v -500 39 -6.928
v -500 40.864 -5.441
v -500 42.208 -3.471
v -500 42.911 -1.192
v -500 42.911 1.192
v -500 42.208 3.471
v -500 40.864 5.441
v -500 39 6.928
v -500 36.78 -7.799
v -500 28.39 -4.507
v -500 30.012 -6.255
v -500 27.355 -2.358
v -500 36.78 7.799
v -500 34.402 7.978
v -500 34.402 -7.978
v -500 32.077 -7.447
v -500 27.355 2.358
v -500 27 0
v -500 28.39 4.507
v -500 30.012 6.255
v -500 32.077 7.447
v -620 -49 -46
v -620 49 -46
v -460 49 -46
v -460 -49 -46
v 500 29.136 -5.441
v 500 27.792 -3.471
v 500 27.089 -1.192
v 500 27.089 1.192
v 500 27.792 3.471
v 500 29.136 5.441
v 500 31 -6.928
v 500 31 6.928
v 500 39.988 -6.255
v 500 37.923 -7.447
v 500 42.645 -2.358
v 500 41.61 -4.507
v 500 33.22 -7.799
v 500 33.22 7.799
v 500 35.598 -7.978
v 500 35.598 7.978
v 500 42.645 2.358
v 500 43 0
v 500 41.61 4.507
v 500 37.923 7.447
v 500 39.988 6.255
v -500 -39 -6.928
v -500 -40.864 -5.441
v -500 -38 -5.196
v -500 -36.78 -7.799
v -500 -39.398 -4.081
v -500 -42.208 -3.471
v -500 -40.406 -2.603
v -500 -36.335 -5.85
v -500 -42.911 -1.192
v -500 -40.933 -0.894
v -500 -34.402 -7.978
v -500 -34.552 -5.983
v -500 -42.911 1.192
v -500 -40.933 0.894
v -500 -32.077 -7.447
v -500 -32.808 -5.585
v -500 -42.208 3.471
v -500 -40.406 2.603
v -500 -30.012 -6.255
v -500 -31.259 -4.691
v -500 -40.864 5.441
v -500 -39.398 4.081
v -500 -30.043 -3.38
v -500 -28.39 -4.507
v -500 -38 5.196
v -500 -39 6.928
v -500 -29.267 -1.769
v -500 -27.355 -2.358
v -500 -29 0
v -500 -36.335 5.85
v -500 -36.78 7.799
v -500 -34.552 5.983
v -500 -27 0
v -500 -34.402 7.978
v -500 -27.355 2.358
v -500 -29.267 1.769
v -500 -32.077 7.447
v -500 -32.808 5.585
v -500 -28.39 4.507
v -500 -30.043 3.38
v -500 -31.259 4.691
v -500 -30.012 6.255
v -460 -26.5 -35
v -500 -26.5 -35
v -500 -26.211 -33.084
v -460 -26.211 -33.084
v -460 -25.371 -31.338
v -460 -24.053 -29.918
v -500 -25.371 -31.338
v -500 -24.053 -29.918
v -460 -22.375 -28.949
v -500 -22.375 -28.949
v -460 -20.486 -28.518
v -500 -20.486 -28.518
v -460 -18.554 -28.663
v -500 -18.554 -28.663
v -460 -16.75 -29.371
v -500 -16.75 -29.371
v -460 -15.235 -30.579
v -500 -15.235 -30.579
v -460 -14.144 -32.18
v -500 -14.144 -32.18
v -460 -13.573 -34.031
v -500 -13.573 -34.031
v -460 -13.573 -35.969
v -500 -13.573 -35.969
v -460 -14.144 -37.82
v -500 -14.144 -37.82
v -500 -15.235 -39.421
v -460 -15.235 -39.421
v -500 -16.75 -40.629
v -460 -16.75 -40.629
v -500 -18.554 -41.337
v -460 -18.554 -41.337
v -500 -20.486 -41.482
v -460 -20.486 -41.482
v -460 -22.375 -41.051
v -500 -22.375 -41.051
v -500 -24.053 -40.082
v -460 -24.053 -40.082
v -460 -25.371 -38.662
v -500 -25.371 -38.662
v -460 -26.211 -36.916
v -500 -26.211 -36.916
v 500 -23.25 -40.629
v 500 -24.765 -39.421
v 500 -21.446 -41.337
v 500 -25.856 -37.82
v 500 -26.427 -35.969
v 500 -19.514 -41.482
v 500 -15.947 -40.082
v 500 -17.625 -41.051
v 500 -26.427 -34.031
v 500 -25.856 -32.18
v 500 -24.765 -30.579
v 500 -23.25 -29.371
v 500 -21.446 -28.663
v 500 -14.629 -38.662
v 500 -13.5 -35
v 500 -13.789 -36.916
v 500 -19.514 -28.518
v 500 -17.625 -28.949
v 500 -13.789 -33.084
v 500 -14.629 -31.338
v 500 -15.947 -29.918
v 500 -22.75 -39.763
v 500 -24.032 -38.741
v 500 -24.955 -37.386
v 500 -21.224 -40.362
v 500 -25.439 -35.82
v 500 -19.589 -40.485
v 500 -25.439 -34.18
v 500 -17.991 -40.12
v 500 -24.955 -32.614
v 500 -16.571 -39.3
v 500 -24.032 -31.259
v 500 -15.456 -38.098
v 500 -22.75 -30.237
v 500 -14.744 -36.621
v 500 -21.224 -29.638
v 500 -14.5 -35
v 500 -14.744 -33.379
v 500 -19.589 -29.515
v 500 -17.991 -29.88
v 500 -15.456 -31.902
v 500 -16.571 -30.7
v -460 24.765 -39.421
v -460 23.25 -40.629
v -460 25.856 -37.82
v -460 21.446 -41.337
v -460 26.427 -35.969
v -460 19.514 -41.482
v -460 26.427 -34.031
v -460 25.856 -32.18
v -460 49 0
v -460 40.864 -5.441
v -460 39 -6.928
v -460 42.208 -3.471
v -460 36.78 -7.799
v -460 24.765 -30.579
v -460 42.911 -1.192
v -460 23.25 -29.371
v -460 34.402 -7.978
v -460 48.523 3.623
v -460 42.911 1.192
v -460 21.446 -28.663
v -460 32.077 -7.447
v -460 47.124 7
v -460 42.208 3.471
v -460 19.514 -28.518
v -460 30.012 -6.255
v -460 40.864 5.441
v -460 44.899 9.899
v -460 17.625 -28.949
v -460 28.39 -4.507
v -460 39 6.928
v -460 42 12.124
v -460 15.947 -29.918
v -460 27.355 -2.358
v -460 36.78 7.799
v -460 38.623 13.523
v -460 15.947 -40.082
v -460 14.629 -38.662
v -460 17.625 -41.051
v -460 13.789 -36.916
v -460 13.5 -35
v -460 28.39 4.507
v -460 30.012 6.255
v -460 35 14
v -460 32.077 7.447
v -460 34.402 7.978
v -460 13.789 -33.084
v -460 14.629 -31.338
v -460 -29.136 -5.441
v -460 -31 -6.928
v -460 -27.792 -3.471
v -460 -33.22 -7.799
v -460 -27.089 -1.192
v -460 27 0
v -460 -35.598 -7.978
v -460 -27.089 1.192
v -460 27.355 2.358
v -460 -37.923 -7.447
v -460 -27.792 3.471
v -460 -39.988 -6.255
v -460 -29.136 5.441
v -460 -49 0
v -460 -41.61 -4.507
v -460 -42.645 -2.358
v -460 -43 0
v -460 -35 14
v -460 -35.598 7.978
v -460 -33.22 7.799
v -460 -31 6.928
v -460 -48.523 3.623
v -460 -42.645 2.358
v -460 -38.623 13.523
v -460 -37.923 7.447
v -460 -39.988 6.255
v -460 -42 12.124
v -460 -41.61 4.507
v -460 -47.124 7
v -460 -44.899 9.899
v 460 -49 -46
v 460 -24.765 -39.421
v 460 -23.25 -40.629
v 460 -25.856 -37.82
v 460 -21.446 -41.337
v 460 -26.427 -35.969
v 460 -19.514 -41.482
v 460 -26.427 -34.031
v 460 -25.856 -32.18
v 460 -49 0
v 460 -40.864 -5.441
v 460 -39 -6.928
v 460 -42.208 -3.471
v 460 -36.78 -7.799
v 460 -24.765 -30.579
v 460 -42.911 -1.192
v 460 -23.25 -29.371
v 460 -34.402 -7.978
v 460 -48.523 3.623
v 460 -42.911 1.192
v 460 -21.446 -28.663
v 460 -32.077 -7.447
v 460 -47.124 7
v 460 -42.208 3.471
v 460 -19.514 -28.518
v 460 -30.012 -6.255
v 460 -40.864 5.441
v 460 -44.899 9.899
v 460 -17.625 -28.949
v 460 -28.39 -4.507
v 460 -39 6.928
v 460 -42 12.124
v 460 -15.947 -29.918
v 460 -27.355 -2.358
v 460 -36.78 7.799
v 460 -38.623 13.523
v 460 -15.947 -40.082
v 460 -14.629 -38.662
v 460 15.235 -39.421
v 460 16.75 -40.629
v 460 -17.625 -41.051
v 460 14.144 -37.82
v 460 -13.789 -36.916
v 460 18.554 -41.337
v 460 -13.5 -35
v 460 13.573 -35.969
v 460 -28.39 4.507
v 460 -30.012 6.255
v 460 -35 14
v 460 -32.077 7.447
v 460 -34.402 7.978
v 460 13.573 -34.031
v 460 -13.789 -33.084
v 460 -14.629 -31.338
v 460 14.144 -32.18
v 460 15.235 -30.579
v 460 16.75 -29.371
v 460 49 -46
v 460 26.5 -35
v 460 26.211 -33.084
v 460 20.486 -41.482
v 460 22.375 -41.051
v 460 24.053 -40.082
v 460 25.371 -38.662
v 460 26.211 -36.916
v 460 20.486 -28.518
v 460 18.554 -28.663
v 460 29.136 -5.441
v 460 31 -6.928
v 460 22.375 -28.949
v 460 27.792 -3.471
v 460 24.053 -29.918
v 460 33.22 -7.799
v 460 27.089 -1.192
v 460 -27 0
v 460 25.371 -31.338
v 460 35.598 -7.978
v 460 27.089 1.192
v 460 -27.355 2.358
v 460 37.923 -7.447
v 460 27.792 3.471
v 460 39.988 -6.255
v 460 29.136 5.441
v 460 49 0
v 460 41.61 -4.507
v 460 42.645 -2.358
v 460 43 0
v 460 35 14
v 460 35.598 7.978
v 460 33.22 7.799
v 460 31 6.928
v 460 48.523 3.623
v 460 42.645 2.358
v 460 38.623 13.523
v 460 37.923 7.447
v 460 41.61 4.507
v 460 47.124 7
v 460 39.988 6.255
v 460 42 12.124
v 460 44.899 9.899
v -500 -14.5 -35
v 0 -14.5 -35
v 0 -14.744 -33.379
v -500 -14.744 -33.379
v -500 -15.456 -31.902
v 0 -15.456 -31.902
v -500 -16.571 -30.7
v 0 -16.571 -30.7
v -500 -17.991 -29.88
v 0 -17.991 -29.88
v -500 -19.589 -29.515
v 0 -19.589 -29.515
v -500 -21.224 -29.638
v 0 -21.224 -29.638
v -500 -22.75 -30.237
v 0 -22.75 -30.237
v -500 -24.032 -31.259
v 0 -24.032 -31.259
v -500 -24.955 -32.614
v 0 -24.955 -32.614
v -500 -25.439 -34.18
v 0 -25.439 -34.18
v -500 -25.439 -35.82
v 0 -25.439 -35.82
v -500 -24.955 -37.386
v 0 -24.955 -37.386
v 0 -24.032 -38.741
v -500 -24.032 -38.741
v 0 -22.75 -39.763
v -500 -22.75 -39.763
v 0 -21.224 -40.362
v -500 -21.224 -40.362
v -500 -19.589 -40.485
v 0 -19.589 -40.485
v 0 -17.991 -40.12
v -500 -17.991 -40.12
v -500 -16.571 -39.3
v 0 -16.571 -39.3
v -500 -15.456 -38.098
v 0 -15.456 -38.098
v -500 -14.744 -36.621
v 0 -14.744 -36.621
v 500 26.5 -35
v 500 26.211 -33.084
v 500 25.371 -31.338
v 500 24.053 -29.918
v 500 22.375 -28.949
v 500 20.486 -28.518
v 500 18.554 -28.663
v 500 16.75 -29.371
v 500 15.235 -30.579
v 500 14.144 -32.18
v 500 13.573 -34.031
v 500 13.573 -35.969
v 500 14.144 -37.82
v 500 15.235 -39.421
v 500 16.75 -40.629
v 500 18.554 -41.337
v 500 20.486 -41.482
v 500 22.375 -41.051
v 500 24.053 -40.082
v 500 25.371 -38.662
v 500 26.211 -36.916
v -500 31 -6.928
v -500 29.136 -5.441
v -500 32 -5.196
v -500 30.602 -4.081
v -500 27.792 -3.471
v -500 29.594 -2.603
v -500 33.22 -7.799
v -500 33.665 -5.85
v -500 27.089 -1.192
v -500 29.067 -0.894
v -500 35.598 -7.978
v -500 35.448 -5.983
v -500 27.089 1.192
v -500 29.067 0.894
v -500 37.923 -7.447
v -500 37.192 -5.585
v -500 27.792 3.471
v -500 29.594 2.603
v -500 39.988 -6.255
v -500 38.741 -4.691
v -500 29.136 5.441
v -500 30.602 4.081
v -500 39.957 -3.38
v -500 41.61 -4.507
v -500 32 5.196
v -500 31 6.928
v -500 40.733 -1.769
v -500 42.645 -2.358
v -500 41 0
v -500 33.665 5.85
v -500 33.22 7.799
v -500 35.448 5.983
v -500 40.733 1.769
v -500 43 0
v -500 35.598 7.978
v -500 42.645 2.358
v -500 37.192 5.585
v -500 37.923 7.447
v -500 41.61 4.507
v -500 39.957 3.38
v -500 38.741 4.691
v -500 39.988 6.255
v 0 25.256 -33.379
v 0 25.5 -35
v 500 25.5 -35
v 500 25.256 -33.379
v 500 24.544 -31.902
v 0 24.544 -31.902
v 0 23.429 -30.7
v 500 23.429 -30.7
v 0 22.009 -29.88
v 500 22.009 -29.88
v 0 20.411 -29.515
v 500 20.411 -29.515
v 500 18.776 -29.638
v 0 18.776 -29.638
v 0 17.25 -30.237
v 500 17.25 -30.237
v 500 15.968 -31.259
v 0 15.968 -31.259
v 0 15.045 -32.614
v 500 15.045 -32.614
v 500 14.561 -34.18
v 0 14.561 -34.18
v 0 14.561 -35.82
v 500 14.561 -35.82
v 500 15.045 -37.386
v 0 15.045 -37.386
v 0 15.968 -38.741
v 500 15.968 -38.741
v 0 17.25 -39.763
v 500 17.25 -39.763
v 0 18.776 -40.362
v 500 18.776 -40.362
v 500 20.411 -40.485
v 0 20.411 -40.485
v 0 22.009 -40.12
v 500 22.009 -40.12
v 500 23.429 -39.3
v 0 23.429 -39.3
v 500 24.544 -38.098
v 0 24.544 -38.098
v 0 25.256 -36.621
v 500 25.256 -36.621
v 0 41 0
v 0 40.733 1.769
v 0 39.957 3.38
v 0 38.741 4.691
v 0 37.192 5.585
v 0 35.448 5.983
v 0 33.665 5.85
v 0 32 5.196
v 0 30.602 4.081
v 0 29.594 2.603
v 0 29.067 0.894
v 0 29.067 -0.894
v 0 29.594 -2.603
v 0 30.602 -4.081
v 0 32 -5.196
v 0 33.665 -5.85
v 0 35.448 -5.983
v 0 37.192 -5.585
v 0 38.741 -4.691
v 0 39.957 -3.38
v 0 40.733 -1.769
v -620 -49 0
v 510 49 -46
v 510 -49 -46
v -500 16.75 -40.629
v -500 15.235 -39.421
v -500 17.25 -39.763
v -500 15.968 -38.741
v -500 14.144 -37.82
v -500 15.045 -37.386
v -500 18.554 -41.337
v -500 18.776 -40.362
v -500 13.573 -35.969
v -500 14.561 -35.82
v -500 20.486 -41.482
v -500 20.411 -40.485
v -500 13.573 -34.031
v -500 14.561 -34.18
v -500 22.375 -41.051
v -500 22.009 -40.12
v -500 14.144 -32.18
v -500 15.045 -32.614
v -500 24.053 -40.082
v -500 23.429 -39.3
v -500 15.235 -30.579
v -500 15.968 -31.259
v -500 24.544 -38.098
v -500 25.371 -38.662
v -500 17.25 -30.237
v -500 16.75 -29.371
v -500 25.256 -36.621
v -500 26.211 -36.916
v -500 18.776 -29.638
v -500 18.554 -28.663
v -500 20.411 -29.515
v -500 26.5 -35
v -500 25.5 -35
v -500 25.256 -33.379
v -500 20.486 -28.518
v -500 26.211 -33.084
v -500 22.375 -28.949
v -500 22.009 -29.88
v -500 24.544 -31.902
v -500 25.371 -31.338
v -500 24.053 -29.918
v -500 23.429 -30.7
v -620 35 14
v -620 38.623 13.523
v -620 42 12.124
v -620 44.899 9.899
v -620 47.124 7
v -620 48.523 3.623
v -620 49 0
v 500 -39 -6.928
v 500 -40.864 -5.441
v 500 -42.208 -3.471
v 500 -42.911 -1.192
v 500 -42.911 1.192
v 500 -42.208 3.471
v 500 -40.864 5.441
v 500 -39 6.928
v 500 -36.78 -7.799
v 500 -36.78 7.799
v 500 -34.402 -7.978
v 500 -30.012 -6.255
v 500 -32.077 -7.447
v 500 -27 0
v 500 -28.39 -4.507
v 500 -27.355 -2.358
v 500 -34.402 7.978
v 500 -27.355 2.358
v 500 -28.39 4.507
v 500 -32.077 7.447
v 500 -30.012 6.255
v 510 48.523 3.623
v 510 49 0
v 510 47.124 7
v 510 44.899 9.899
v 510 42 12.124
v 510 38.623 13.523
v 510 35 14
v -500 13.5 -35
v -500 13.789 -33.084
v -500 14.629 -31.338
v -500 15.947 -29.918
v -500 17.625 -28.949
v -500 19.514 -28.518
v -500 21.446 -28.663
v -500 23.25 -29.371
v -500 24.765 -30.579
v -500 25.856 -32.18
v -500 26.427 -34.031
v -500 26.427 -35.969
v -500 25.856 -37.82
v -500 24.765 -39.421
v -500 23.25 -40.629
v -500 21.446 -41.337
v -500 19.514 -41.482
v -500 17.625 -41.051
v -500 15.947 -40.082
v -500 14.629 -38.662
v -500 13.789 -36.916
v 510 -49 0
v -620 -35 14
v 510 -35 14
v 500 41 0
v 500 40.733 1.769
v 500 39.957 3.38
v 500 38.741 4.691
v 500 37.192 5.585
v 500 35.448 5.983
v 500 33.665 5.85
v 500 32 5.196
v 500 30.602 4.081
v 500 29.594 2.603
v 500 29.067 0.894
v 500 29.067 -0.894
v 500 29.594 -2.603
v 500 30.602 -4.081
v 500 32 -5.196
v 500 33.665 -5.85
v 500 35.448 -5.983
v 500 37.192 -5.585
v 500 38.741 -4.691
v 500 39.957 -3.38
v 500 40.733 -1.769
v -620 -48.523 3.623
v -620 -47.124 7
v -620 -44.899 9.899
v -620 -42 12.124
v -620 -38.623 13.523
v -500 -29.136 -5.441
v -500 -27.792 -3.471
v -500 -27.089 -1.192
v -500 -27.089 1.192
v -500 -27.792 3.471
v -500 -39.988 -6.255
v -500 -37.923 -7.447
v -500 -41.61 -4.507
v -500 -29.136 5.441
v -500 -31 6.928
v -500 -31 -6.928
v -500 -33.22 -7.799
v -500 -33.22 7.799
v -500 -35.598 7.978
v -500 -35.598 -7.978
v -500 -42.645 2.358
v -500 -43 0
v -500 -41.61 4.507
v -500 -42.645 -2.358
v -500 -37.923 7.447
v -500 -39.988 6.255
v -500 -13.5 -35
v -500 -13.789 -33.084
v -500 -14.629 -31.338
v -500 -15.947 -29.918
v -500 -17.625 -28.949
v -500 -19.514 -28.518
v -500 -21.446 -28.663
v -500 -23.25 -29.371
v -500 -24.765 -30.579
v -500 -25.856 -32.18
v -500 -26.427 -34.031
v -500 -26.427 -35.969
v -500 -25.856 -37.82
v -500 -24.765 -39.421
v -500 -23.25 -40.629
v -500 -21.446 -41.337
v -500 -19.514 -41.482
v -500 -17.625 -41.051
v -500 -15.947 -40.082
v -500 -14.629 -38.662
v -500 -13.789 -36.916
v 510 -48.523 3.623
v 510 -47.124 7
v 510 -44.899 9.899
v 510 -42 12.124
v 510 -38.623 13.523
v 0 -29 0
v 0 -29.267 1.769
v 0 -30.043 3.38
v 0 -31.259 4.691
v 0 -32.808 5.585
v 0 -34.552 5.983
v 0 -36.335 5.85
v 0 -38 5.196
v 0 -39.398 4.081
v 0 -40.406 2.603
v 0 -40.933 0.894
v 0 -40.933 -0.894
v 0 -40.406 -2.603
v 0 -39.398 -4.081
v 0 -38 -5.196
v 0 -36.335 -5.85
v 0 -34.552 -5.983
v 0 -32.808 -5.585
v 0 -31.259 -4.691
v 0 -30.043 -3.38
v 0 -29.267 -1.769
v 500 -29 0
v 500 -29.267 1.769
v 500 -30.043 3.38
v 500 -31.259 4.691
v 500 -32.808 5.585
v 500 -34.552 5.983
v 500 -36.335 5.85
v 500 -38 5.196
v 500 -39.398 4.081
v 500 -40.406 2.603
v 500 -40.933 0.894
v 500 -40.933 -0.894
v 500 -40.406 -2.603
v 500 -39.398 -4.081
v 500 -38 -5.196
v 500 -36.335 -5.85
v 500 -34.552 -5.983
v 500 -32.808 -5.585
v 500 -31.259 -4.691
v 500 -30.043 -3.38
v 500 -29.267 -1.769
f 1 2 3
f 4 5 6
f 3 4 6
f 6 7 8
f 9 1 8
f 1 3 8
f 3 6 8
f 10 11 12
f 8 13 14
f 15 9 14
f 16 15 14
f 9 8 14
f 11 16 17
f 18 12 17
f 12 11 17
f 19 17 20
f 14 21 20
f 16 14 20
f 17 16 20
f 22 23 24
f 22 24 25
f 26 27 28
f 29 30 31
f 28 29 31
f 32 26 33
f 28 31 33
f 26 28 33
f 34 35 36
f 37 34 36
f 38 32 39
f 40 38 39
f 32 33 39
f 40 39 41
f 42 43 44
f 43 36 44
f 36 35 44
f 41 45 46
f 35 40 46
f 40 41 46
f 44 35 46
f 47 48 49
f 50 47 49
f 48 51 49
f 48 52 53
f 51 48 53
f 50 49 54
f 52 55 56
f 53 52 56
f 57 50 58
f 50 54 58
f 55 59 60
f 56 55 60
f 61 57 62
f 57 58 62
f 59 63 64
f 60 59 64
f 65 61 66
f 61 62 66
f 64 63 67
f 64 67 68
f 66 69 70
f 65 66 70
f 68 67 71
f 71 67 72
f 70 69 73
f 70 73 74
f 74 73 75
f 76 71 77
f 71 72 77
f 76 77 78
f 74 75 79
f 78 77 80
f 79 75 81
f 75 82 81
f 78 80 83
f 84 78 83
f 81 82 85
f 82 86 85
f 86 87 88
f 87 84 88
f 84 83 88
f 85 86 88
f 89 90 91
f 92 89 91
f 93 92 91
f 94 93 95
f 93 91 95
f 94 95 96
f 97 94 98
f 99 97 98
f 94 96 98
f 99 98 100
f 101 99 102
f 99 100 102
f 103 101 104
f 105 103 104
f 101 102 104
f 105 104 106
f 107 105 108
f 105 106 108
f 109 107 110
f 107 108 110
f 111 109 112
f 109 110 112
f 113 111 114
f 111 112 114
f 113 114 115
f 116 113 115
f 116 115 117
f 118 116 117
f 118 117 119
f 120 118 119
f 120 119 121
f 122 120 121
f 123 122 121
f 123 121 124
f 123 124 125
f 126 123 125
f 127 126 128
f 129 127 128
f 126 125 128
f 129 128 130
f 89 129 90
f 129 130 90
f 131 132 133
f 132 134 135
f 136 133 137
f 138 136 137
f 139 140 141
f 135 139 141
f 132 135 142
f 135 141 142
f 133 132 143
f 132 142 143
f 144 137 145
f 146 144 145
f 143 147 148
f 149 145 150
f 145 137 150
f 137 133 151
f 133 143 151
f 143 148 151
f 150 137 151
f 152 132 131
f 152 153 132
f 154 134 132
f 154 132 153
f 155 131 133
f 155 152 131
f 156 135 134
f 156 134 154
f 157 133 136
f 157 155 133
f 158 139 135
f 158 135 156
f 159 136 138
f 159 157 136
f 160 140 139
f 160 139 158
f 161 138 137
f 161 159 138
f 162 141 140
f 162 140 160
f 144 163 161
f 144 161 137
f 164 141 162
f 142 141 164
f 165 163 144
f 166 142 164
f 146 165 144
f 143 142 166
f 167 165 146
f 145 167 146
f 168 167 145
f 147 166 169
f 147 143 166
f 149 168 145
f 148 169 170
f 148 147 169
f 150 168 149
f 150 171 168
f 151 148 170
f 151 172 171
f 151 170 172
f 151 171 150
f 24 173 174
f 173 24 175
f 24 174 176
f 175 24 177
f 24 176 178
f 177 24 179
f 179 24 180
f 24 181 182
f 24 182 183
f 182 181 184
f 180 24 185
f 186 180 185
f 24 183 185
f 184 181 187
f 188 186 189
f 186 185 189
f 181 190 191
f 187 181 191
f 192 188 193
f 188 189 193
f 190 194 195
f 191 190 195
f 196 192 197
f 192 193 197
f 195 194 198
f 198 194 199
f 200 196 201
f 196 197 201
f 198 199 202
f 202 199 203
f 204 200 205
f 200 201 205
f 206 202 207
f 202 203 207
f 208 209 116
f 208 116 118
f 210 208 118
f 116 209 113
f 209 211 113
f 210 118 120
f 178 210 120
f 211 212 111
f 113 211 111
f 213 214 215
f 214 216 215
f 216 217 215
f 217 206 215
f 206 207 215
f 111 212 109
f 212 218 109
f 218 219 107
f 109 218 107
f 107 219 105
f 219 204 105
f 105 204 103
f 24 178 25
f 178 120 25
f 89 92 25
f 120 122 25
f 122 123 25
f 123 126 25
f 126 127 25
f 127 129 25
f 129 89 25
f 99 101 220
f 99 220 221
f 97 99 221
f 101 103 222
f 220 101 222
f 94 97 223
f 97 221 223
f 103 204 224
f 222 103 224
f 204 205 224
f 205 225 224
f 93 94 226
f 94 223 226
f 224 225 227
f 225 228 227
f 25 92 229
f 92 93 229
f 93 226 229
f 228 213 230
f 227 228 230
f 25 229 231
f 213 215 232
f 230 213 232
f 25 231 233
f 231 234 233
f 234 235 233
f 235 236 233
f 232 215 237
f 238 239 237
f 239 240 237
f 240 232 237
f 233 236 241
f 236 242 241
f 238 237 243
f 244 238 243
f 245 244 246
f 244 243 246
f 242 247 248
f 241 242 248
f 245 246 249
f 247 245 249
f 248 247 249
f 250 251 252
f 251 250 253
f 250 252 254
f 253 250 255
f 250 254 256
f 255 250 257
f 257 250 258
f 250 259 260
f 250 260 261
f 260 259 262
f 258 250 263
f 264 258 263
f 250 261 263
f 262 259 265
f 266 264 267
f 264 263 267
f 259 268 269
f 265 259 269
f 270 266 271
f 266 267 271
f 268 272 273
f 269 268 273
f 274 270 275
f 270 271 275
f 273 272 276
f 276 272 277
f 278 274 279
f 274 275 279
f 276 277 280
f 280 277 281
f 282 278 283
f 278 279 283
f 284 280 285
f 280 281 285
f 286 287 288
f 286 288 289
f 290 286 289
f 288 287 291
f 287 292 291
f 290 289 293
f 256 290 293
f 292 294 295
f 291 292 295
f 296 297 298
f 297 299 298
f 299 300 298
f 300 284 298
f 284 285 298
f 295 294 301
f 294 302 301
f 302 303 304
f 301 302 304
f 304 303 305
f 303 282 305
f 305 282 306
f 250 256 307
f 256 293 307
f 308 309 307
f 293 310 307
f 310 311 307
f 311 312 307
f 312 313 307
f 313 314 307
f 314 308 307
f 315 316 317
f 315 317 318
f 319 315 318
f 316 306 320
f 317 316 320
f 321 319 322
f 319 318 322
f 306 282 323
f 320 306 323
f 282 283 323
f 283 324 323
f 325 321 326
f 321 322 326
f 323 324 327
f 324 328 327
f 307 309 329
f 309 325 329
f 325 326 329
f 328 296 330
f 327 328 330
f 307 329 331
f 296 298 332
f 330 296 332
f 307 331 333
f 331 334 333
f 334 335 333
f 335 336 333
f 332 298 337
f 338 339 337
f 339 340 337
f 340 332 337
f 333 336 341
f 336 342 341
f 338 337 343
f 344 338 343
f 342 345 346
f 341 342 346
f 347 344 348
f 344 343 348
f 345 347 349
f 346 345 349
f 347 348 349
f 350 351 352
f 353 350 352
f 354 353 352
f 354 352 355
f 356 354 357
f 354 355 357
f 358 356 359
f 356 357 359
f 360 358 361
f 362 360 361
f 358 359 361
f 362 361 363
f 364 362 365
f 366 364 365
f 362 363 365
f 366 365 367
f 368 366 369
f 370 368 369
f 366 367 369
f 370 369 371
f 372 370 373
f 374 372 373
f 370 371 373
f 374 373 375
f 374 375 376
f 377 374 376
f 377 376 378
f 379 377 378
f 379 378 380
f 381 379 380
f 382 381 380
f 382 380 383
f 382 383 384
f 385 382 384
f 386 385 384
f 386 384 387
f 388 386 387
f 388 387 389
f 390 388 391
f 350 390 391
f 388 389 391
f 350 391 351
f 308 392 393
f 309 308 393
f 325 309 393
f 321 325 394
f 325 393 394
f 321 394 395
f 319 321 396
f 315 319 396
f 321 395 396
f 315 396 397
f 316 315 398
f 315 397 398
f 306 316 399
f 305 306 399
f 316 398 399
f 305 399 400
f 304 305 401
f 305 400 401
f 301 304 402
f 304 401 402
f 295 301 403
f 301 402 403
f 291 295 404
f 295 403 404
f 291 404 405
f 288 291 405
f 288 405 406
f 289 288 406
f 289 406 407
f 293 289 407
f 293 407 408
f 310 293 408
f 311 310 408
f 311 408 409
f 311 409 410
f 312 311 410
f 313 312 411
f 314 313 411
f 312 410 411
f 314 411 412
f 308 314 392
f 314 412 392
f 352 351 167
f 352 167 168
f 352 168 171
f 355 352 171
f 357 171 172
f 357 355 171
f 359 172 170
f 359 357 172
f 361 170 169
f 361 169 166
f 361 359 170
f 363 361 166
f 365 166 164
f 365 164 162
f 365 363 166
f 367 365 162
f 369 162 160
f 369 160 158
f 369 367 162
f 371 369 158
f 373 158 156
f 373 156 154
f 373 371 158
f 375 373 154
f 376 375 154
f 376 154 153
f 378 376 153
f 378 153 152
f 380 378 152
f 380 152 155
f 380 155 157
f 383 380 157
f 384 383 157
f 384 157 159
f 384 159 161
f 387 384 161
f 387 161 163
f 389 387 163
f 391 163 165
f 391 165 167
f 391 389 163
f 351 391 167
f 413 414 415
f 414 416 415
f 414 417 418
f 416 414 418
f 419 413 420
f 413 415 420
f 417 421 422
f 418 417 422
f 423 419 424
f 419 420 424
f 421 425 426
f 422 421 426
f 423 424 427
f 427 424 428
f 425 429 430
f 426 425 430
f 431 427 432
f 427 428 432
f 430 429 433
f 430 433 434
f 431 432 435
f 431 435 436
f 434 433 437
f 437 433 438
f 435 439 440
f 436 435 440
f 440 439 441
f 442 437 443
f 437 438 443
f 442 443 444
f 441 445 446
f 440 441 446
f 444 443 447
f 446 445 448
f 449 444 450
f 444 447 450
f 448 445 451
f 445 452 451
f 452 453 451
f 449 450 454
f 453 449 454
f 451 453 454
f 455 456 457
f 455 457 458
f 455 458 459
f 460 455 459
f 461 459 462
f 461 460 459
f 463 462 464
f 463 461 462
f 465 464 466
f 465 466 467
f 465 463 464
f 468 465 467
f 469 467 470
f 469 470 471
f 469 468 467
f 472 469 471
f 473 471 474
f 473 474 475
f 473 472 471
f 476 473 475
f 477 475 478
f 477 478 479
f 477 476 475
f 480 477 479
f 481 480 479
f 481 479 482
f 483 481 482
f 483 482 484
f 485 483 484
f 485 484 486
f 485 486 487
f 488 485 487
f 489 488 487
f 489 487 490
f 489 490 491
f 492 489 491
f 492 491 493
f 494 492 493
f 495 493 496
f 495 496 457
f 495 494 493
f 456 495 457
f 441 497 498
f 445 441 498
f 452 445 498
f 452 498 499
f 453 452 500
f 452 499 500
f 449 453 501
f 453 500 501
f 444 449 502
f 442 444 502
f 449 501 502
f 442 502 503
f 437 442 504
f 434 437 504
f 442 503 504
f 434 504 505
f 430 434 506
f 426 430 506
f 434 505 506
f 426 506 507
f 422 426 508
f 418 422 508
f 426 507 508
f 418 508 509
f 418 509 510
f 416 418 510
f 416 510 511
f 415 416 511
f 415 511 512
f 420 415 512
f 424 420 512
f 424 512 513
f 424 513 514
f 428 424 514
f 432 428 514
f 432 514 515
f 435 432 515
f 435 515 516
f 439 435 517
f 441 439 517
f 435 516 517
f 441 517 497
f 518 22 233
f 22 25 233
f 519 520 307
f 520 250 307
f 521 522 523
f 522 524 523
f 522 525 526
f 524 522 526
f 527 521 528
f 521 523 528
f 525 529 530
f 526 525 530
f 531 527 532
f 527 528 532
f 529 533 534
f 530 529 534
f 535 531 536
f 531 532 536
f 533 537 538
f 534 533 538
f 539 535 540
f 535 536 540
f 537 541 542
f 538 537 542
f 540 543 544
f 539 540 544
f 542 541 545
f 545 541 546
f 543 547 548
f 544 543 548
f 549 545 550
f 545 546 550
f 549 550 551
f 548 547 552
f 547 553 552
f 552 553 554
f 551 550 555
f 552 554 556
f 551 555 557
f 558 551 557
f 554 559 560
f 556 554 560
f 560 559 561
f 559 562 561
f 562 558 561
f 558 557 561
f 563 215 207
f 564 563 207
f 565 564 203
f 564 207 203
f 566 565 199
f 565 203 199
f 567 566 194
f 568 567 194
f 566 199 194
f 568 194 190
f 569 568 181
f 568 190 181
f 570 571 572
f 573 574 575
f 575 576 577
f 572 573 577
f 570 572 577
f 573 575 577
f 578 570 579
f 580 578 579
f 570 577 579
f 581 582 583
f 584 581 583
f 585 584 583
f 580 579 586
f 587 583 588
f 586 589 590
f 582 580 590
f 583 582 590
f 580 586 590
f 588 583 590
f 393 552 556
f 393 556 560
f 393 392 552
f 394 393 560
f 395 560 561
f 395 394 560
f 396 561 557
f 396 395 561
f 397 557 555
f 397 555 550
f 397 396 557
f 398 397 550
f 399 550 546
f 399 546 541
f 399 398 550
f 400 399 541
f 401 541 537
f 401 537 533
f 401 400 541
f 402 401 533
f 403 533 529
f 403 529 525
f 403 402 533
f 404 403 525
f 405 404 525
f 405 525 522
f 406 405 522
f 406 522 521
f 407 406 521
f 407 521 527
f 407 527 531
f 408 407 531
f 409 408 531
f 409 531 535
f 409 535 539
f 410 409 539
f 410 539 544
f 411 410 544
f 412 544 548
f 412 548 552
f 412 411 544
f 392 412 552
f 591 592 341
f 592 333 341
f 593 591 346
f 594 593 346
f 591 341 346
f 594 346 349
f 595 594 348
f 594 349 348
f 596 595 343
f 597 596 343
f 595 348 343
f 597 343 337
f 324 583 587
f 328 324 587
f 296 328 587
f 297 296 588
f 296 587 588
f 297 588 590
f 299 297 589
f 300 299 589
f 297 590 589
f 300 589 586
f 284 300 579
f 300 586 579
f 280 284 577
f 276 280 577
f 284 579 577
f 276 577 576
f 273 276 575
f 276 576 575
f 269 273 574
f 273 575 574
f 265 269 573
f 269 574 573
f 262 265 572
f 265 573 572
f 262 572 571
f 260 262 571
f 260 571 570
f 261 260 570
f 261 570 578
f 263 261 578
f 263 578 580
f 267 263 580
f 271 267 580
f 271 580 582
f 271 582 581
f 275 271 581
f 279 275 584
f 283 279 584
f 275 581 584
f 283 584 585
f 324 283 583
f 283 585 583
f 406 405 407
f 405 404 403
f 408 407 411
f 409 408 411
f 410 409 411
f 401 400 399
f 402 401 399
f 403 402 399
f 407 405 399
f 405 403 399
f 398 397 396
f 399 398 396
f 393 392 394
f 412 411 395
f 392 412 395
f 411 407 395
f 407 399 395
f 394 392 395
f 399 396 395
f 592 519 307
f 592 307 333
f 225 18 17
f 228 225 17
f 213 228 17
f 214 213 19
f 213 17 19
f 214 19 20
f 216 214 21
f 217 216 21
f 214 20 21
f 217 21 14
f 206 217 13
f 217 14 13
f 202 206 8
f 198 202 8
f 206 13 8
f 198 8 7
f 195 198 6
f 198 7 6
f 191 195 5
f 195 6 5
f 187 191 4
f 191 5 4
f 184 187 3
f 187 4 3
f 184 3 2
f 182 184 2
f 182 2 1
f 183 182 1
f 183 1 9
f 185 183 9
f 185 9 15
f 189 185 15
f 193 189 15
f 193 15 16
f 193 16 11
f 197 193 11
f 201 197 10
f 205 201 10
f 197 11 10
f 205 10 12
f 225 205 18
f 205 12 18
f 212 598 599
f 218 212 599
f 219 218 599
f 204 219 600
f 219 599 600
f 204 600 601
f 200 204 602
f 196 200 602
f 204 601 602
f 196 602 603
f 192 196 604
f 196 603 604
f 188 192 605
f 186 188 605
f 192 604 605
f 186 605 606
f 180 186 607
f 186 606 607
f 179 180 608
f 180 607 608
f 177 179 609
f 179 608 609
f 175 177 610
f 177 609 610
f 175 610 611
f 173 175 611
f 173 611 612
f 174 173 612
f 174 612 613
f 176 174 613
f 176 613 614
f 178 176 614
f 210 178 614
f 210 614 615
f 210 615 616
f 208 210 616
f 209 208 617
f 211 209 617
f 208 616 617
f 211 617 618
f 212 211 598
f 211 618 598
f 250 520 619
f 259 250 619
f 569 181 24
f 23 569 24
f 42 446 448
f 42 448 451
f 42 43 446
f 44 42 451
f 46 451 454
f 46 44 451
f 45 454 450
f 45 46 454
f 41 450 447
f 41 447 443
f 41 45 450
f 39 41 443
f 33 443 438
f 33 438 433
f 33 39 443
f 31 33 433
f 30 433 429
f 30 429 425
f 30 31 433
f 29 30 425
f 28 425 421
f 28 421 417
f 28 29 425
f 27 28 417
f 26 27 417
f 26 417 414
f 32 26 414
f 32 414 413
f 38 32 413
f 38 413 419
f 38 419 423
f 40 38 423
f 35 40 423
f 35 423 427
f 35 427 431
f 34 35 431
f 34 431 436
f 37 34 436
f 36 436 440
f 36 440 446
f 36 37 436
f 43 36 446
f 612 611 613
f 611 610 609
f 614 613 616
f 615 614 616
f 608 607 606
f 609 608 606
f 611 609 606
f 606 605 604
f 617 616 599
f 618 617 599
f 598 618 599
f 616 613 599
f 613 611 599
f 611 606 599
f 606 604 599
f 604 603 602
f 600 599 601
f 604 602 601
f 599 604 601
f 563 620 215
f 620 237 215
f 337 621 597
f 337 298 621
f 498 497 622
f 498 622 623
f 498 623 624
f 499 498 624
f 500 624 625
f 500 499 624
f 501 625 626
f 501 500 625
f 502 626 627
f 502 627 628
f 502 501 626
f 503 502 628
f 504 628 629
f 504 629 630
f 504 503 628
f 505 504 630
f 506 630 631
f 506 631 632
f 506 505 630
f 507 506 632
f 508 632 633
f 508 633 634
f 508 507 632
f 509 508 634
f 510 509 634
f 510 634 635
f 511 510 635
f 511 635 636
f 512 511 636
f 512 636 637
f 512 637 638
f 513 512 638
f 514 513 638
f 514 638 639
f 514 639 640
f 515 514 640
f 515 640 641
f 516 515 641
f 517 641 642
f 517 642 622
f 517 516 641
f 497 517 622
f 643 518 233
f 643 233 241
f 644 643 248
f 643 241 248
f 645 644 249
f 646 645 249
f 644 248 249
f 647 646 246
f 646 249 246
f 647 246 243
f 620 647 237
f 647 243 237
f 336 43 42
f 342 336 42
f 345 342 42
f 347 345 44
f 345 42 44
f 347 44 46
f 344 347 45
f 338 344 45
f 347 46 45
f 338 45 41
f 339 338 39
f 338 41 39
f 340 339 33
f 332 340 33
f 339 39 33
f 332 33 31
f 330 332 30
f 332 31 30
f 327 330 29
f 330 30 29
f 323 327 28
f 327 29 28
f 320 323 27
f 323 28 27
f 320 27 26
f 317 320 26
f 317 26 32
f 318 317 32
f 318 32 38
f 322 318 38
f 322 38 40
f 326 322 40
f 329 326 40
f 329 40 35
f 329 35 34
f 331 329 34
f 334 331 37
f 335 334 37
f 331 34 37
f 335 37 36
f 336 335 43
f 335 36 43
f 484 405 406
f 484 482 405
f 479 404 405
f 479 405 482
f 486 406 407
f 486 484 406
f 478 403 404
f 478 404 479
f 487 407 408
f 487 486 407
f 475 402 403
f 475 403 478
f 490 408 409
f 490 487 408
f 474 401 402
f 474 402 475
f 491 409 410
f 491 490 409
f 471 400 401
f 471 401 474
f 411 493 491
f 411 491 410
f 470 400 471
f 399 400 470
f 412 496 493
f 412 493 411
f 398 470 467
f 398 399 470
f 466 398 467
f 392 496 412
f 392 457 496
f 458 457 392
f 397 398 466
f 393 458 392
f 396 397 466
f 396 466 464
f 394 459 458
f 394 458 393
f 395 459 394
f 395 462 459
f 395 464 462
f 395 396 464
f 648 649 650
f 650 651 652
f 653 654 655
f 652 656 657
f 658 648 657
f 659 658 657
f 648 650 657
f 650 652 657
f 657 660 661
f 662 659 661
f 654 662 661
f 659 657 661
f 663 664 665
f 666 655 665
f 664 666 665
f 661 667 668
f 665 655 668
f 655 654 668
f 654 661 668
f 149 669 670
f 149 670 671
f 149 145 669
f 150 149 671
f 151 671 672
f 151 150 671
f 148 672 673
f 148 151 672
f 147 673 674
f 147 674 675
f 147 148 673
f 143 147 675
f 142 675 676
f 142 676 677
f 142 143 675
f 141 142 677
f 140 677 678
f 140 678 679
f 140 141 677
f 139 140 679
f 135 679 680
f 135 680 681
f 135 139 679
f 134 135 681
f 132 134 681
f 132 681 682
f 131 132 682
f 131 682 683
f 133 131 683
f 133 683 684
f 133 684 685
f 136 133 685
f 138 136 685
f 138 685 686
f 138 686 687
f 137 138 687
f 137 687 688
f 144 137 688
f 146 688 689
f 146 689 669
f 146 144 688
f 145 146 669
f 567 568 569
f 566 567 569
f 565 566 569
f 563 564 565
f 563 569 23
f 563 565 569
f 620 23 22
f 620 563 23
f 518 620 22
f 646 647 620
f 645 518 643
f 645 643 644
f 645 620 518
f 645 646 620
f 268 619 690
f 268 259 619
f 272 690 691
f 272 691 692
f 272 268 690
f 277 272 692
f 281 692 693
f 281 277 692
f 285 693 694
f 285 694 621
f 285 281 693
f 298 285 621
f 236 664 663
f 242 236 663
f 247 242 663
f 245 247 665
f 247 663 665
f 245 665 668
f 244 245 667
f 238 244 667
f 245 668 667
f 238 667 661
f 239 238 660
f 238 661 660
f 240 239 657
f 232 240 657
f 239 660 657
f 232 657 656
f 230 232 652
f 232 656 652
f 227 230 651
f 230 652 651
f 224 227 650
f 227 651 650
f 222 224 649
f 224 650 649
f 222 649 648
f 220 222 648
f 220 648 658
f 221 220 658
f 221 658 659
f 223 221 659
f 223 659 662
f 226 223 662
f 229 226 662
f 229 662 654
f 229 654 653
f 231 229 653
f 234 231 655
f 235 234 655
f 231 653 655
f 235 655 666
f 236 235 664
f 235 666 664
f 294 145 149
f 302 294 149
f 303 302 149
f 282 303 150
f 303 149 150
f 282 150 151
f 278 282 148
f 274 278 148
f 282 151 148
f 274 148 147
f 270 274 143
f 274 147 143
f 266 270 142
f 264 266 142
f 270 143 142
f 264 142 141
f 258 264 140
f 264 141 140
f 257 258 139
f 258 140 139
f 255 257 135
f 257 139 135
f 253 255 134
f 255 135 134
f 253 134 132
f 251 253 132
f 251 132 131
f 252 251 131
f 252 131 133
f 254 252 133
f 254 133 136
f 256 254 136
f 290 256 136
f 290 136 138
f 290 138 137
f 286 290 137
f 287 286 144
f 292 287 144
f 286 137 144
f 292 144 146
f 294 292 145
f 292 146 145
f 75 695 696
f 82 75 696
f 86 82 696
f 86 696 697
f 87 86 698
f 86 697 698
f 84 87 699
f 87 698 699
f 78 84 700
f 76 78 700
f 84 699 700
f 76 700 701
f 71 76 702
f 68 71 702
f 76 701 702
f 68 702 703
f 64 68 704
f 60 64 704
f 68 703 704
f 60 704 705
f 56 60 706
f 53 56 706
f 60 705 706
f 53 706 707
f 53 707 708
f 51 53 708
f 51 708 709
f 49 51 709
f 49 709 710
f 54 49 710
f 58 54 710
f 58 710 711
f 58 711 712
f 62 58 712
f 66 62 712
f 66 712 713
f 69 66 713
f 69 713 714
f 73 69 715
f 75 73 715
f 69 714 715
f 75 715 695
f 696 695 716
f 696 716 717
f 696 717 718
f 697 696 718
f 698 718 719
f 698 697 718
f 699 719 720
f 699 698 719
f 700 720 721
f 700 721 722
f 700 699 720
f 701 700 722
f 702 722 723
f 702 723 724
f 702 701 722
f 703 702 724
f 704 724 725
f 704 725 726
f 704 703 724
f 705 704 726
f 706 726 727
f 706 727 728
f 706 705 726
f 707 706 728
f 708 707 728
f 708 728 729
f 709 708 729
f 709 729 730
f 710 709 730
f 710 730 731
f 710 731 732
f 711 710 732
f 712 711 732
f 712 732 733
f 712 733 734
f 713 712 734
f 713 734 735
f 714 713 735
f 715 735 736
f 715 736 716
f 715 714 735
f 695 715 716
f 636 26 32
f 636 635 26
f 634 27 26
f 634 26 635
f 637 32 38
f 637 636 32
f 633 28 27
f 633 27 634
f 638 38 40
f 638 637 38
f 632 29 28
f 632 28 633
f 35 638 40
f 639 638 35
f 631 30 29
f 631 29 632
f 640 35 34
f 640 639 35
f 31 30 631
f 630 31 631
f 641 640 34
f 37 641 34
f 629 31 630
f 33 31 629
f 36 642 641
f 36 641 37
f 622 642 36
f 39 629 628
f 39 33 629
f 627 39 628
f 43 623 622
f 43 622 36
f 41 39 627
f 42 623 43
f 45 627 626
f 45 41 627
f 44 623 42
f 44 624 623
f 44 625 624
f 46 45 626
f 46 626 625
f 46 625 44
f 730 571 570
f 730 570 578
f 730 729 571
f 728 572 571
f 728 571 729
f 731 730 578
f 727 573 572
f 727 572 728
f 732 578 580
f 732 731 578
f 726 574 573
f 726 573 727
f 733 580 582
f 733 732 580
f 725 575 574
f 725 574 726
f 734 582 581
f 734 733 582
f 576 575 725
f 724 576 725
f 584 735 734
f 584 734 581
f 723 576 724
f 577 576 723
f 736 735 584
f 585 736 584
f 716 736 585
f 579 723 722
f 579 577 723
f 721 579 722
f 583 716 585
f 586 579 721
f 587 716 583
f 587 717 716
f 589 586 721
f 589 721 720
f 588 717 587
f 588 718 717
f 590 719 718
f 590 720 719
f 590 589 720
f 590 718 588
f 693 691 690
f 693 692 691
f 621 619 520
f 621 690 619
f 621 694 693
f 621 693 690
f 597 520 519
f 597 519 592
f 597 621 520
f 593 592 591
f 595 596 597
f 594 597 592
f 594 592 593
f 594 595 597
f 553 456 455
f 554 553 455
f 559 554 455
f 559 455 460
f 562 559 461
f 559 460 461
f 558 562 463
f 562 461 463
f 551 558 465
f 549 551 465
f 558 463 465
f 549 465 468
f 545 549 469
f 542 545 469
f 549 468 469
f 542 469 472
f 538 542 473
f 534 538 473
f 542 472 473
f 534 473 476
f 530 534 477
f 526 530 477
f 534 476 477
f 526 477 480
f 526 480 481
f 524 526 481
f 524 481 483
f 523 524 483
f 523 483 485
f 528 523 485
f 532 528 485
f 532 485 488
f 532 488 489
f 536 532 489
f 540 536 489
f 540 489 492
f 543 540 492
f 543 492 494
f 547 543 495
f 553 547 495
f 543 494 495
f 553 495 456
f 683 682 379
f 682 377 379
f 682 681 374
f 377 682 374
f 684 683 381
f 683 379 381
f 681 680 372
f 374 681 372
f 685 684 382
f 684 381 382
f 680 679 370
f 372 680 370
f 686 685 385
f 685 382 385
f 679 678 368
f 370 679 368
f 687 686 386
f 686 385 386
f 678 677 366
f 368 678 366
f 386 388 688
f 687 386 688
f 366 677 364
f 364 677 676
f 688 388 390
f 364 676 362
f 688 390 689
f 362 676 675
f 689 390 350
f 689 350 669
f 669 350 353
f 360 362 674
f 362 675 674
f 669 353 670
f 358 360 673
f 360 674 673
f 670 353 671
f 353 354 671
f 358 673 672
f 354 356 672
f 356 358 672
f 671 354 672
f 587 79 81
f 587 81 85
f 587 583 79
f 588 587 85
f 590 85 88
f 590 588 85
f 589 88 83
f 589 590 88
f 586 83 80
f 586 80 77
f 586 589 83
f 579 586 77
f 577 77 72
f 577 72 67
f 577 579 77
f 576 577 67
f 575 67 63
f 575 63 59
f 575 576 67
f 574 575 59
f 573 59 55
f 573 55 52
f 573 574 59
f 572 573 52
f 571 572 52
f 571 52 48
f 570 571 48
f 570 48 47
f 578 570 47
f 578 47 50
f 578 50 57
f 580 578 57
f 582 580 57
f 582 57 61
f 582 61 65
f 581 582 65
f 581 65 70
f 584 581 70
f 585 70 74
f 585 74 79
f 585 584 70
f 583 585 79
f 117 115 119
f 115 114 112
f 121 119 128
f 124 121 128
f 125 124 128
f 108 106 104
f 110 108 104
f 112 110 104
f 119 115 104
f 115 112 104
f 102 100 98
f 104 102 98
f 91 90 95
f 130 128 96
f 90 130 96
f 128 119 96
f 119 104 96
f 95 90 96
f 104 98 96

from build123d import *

# Parameters (mm, degrees)
F0_R          = 8
F0_R_2        = 6
F1_DEPTH      = 500
F1_DEPTH_BACK = 500
F0_R_3        = 6.5
F0_R_4        = 5.5
F2_W          = 98
F2_H          = 60
F2_R          = 6.5
F2_R_2        = 8
F3_DEPTH      = 40
F4_W          = 98
F4_H          = 60
F5_DEPTH      = 10
F6_R          = 14
F7_R          = 6.5
F7_R_2        = 8
F8_DEPTH      = 40
F10_DEPTH     = 120


with BuildPart() as f1:
    # F0 (on Right) → F1 (new body, two sides)
    with BuildSketch(Plane.YZ) as f1_sk:
        with Locations((35, 0)):
            Circle(F0_R)
        with Locations((35, 0)):
            Circle(F0_R_2, mode=Mode.SUBTRACT)
    extrude(amount=F1_DEPTH)
    extrude(f1_sk.sketch, amount=-F1_DEPTH_BACK)


with BuildPart() as f1b:
    # F0 (on Right) → F1, piece 2 (new body, two sides)
    with BuildSketch(Plane.YZ) as f1_2_sk:
        with Locations((-35, 0)):
            Circle(F0_R)
        with Locations((-35, 0)):
            Circle(F0_R_2, mode=Mode.SUBTRACT)
    extrude(amount=F1_DEPTH)
    extrude(f1_2_sk.sketch, amount=-F1_DEPTH_BACK)


with BuildPart() as f1c:
    # F0 (on Right) → F1, piece 3 (new body, two sides)
    with BuildSketch(Plane.YZ) as f1_3_sk:
        with Locations((-20, -35)):
            Circle(F0_R_3)
        with Locations((-20, -35)):
            Circle(F0_R_4, mode=Mode.SUBTRACT)
    extrude(amount=F1_DEPTH)
    extrude(f1_3_sk.sketch, amount=-F1_DEPTH_BACK)


with BuildPart() as f1d:
    # F0 (on Right) → F1, piece 4 (new body, two sides)
    with BuildSketch(Plane.YZ) as f1_4_sk:
        with Locations((20, -35)):
            Circle(F0_R_3)
        with Locations((20, -35)):
            Circle(F0_R_4, mode=Mode.SUBTRACT)
    extrude(amount=F1_DEPTH)
    extrude(f1_4_sk.sketch, amount=-F1_DEPTH_BACK)


with BuildPart() as f3:
    # F2 (on face) → F3 (new body)
    with BuildSketch(Plane.YZ.offset(500)):
        with Locations((0, -16)):
            Rectangle(F2_W, F2_H)
        with Locations((-20, -35)):
            Circle(F2_R, mode=Mode.SUBTRACT)
        with Locations((20, -35)):
            Circle(F2_R, mode=Mode.SUBTRACT)
        with Locations((-35, 0)):
            Circle(F2_R_2, mode=Mode.SUBTRACT)
        with Locations((35, 0)):
            Circle(F2_R_2, mode=Mode.SUBTRACT)
    extrude(amount=-F3_DEPTH)

    # F4 (on face) → F5 (join)
    with BuildSketch(Plane.YZ.offset(500)):
        with Locations((0, -16)):
            Rectangle(F4_W, F4_H)
    extrude(amount=F5_DEPTH)

    # F6
    f6_edges = [f3.edges().sort_by_distance(p)[0] for p in [
        (485, -49, 14),
        (485, 49, 14),
    ]]
    fillet(f6_edges, radius=F6_R)


with BuildPart() as f8:
    # F7 (on face) → F8 (new body)
    with BuildSketch(Plane(origin=(-500, 0, 0), x_dir=(0, -1, 0), z_dir=(-1, 0, 0))):
        with BuildLine():
            ThreePointArc((49, 0), (44.8994949366, 9.8994949366), (35, 14))
            Line((35, 14), (-35, 14))
            ThreePointArc((-35, 14), (-44.8994949366, 9.8994949366), (-49, 0))
            Line((-49, 0), (-49, -46))
            Line((-49, -46), (49, -46))
            Line((49, -46), (49, 0))
        make_face()
        with Locations((-20, -35)):
            Circle(F7_R, mode=Mode.SUBTRACT)
        with Locations((20, -35)):
            Circle(F7_R, mode=Mode.SUBTRACT)
        with Locations((-35, 0)):
            Circle(F7_R_2, mode=Mode.SUBTRACT)
        with Locations((35, 0)):
            Circle(F7_R_2, mode=Mode.SUBTRACT)
    extrude(amount=-F8_DEPTH)

    # F9 (on face) → F10 (join)
    with BuildSketch(Plane(origin=(-500, 0, 0), x_dir=(0, -1, 0), z_dir=(-1, 0, 0))):
        with BuildLine():
            Line((-49, -46), (49, -46))
            Line((49, -46), (49, 0))
            ThreePointArc((49, 0), (44.8994949366, 9.8994949366), (35, 14))
            Line((35, 14), (-35, 14))
            ThreePointArc((-35, 14), (-44.8994949366, 9.8994949366), (-49, 0))
            Line((-49, 0), (-49, -46))
        make_face()
    extrude(amount=F10_DEPTH)


solid = Compound([f1.part, f1b.part, f1c.part, f1d.part, f3.part, f8.part])
